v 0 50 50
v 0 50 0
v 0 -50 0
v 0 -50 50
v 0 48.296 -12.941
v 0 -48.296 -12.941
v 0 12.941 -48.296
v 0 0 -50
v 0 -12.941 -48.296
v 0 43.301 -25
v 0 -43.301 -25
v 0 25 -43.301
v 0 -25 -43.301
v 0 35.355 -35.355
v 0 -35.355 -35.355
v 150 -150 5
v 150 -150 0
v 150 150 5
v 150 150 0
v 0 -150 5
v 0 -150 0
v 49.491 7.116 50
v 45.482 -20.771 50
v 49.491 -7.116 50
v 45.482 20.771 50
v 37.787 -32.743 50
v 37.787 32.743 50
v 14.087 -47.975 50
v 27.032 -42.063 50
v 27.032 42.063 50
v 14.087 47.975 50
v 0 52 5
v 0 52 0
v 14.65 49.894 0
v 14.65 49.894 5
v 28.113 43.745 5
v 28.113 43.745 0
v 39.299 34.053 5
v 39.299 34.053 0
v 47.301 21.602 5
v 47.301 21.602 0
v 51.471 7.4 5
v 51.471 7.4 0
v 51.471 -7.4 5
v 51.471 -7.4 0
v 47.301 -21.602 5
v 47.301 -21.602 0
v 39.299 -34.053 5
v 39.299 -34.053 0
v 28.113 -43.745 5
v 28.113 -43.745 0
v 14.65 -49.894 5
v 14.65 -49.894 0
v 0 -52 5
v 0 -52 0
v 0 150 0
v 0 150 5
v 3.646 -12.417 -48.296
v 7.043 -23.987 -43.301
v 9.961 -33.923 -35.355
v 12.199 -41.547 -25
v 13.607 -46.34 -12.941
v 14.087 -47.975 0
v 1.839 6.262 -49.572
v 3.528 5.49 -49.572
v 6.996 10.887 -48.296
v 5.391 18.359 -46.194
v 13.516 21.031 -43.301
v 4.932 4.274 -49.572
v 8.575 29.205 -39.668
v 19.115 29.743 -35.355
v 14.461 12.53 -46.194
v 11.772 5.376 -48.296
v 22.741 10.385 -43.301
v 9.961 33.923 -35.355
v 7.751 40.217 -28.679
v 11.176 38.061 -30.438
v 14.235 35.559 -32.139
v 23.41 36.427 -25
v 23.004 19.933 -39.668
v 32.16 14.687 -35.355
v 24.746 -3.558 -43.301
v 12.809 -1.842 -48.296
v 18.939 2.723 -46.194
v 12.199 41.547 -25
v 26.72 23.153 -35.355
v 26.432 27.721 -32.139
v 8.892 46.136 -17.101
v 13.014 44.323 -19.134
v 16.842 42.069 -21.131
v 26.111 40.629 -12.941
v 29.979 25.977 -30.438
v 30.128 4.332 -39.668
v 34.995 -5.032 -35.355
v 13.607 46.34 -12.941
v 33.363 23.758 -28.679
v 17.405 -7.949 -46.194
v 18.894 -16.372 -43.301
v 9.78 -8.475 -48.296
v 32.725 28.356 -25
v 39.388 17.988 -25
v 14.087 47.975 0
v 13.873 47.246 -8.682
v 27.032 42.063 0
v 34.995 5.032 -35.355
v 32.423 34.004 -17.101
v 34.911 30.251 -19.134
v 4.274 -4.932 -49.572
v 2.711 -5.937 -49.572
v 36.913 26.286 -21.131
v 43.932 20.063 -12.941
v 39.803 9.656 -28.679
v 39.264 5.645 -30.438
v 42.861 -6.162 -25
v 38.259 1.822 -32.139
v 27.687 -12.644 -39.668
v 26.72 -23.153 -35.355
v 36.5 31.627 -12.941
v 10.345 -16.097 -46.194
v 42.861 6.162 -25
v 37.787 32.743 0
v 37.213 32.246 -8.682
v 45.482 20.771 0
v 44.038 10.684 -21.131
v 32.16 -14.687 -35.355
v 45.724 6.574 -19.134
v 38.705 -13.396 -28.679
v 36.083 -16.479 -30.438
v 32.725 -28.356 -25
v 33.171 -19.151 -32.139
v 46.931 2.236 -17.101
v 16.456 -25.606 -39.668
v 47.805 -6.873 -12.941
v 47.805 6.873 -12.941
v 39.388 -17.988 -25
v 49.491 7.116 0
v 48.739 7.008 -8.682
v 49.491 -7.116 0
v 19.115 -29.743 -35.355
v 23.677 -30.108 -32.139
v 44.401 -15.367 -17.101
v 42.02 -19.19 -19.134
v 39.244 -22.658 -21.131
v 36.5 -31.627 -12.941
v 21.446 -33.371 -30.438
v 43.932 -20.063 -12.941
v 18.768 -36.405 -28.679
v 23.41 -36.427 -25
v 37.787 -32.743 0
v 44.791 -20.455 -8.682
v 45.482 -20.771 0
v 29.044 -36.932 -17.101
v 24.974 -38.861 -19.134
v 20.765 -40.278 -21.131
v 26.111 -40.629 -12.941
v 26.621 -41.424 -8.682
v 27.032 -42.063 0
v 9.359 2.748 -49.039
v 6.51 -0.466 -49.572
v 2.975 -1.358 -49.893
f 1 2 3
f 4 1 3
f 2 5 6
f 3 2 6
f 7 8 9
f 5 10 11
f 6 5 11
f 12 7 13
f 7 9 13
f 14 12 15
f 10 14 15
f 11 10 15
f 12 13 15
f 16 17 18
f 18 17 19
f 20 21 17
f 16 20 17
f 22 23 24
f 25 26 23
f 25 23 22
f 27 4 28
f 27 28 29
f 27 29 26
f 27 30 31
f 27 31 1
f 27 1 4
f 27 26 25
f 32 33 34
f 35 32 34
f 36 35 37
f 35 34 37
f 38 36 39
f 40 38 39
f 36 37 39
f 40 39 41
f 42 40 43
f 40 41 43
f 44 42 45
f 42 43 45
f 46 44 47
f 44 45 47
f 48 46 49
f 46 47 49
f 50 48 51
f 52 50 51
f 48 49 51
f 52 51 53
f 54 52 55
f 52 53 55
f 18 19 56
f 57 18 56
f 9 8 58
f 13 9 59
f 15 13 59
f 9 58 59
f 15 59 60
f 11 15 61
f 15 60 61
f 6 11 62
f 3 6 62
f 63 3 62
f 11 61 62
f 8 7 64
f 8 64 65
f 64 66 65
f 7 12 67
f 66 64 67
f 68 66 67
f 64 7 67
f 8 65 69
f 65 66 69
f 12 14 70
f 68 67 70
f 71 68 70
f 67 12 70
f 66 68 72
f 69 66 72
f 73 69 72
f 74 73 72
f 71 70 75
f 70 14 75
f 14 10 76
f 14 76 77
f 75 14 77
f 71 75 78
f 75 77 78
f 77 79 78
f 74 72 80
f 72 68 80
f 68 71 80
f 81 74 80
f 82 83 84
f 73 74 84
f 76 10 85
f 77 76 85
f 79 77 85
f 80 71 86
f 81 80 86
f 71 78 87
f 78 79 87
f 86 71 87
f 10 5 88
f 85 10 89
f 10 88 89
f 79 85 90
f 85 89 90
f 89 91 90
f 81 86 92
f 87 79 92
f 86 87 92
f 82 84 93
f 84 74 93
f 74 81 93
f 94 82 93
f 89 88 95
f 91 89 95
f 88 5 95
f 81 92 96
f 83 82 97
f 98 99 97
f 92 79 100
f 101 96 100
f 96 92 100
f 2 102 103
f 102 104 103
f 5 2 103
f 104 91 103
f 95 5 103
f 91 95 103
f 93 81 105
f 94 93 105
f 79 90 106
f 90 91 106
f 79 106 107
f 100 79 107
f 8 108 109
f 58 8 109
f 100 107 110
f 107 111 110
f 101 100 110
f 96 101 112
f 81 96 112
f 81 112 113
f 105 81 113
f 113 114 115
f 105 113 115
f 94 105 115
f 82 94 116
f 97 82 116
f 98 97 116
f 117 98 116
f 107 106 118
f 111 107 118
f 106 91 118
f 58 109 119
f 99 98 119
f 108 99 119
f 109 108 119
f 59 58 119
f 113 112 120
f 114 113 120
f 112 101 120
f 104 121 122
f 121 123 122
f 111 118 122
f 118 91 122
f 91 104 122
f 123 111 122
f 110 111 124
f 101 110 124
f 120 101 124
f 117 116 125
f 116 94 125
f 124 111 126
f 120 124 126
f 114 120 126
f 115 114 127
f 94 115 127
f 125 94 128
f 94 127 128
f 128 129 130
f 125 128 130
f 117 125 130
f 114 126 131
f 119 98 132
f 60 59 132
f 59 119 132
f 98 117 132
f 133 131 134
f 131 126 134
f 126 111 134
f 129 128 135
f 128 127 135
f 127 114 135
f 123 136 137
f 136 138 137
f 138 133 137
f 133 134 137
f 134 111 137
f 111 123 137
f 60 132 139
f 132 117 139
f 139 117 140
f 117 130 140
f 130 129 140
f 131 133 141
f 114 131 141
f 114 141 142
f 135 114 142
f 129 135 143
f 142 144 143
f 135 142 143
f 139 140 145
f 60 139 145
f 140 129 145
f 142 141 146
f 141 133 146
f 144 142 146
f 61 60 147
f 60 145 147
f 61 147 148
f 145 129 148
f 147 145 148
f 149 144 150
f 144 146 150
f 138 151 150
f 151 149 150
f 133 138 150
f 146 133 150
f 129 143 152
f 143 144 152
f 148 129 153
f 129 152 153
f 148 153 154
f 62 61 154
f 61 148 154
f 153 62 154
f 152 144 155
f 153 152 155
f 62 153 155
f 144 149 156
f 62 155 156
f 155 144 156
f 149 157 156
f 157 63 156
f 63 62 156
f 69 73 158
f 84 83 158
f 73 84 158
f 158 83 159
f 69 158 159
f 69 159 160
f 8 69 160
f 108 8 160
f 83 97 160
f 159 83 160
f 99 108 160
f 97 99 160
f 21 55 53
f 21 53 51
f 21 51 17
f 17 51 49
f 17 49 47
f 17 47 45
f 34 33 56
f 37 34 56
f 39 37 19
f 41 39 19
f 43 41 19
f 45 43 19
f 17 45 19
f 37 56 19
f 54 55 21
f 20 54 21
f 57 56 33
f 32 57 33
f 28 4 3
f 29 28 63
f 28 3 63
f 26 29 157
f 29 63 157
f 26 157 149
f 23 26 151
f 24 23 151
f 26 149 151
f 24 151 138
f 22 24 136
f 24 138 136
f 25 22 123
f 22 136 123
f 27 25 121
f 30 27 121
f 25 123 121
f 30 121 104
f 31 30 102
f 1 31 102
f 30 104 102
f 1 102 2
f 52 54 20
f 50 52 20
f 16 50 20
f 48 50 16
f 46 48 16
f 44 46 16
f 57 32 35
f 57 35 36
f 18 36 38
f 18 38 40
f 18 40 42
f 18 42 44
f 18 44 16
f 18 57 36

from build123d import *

# Parameters (mm, degrees)
F1_ANGLE = 180
F2_DEPTH = 50
F4_DEPTH = 5


with BuildPart() as f1:
    # F0 (on Right) → F1 (revolve)
    with BuildSketch(Plane.YZ):
        with BuildLine():
            Line((50, 0), (0, 0))
            Line((0, 0), (0, -50))
            ThreePointArc((0, -50), (35.355339, -35.355339), (50, 0))
        make_face()
    revolve(axis=Axis((0, 0, -25), (0, 0, -1)), revolution_arc=F1_ANGLE)

    # F1_face (on face) → F2 (join)
    with BuildSketch(Plane(origin=(21.220659, 0, 0), x_dir=(1, 0, 0), z_dir=(0, 0, 1))):
        with BuildLine():
            ThreePointArc((-21.220659, -50), (28.779341, 0), (-21.220659, 50))
            Line((-21.220659, 50), (-21.220659, -50))
        make_face()
    extrude(amount=F2_DEPTH)


with BuildPart() as f4:
    # F3 (on Top) → F4 (new body)
    with BuildSketch(Plane.XY):
        with BuildLine():
            ThreePointArc((0, 52), (52, 0), (0, -52))
            Line((0, -52), (0, -150))
            Line((0, -150), (150, -150))
            Line((150, -150), (150, 150))
            Line((150, 150), (0, 150))
            Line((0, 150), (0, 52))
        make_face()
    extrude(amount=F4_DEPTH)


solid = Compound([f1.part, f4.part])
